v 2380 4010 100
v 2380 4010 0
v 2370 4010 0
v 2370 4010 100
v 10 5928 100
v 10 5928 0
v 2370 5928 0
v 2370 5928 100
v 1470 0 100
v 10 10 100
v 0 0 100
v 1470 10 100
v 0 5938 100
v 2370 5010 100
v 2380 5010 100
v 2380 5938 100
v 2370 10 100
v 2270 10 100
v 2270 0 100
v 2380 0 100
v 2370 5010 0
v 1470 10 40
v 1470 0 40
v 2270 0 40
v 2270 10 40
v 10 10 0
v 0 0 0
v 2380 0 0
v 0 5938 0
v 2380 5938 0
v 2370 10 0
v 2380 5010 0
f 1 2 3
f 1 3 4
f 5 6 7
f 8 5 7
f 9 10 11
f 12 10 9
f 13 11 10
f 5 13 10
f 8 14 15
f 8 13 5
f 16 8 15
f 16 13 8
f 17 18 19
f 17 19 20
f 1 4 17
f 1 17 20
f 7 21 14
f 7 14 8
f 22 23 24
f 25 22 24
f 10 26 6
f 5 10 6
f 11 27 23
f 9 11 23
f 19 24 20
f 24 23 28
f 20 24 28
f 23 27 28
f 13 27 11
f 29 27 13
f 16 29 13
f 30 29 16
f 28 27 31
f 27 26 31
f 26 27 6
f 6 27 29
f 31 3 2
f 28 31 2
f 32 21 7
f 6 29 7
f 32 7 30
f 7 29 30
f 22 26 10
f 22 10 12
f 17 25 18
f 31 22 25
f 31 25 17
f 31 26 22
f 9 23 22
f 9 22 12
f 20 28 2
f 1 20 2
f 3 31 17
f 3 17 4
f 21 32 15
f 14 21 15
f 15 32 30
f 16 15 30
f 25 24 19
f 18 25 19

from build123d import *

# Parameters (mm, degrees)
F0_W     = 2380
F0_H     = 5938
F0_W_2   = 2360
F0_H_2   = 5918
F1_DEPTH = 100
F2_W     = 1000
F2_H     = 100
F3_DEPTH = 25
F4_W     = 800
F4_H     = 60
F5_DEPTH = 25


with BuildPart() as f1:
    # F0 (on Top) → F1 (new body)
    with BuildSketch(Plane.XY):
        with Locations((1190, 2969)):
            Rectangle(F0_W, F0_H)
        with Locations((1190, 2969)):
            Rectangle(F0_W_2, F0_H_2, mode=Mode.SUBTRACT)
    extrude(amount=F1_DEPTH)

    # F2 (on face) → F3 (cut)
    with BuildSketch(Plane.YZ.offset(2380)):
        with Locations((4510, 50)):
            Rectangle(F2_W, F2_H)
    extrude(amount=-F3_DEPTH, mode=Mode.SUBTRACT)

    # F4 (on face) → F5 (cut)
    with BuildSketch(Plane.XZ):
        with Locations((1870, 70)):
            Rectangle(F4_W, F4_H)
    extrude(amount=-F5_DEPTH, mode=Mode.SUBTRACT)


solid = f1.part
